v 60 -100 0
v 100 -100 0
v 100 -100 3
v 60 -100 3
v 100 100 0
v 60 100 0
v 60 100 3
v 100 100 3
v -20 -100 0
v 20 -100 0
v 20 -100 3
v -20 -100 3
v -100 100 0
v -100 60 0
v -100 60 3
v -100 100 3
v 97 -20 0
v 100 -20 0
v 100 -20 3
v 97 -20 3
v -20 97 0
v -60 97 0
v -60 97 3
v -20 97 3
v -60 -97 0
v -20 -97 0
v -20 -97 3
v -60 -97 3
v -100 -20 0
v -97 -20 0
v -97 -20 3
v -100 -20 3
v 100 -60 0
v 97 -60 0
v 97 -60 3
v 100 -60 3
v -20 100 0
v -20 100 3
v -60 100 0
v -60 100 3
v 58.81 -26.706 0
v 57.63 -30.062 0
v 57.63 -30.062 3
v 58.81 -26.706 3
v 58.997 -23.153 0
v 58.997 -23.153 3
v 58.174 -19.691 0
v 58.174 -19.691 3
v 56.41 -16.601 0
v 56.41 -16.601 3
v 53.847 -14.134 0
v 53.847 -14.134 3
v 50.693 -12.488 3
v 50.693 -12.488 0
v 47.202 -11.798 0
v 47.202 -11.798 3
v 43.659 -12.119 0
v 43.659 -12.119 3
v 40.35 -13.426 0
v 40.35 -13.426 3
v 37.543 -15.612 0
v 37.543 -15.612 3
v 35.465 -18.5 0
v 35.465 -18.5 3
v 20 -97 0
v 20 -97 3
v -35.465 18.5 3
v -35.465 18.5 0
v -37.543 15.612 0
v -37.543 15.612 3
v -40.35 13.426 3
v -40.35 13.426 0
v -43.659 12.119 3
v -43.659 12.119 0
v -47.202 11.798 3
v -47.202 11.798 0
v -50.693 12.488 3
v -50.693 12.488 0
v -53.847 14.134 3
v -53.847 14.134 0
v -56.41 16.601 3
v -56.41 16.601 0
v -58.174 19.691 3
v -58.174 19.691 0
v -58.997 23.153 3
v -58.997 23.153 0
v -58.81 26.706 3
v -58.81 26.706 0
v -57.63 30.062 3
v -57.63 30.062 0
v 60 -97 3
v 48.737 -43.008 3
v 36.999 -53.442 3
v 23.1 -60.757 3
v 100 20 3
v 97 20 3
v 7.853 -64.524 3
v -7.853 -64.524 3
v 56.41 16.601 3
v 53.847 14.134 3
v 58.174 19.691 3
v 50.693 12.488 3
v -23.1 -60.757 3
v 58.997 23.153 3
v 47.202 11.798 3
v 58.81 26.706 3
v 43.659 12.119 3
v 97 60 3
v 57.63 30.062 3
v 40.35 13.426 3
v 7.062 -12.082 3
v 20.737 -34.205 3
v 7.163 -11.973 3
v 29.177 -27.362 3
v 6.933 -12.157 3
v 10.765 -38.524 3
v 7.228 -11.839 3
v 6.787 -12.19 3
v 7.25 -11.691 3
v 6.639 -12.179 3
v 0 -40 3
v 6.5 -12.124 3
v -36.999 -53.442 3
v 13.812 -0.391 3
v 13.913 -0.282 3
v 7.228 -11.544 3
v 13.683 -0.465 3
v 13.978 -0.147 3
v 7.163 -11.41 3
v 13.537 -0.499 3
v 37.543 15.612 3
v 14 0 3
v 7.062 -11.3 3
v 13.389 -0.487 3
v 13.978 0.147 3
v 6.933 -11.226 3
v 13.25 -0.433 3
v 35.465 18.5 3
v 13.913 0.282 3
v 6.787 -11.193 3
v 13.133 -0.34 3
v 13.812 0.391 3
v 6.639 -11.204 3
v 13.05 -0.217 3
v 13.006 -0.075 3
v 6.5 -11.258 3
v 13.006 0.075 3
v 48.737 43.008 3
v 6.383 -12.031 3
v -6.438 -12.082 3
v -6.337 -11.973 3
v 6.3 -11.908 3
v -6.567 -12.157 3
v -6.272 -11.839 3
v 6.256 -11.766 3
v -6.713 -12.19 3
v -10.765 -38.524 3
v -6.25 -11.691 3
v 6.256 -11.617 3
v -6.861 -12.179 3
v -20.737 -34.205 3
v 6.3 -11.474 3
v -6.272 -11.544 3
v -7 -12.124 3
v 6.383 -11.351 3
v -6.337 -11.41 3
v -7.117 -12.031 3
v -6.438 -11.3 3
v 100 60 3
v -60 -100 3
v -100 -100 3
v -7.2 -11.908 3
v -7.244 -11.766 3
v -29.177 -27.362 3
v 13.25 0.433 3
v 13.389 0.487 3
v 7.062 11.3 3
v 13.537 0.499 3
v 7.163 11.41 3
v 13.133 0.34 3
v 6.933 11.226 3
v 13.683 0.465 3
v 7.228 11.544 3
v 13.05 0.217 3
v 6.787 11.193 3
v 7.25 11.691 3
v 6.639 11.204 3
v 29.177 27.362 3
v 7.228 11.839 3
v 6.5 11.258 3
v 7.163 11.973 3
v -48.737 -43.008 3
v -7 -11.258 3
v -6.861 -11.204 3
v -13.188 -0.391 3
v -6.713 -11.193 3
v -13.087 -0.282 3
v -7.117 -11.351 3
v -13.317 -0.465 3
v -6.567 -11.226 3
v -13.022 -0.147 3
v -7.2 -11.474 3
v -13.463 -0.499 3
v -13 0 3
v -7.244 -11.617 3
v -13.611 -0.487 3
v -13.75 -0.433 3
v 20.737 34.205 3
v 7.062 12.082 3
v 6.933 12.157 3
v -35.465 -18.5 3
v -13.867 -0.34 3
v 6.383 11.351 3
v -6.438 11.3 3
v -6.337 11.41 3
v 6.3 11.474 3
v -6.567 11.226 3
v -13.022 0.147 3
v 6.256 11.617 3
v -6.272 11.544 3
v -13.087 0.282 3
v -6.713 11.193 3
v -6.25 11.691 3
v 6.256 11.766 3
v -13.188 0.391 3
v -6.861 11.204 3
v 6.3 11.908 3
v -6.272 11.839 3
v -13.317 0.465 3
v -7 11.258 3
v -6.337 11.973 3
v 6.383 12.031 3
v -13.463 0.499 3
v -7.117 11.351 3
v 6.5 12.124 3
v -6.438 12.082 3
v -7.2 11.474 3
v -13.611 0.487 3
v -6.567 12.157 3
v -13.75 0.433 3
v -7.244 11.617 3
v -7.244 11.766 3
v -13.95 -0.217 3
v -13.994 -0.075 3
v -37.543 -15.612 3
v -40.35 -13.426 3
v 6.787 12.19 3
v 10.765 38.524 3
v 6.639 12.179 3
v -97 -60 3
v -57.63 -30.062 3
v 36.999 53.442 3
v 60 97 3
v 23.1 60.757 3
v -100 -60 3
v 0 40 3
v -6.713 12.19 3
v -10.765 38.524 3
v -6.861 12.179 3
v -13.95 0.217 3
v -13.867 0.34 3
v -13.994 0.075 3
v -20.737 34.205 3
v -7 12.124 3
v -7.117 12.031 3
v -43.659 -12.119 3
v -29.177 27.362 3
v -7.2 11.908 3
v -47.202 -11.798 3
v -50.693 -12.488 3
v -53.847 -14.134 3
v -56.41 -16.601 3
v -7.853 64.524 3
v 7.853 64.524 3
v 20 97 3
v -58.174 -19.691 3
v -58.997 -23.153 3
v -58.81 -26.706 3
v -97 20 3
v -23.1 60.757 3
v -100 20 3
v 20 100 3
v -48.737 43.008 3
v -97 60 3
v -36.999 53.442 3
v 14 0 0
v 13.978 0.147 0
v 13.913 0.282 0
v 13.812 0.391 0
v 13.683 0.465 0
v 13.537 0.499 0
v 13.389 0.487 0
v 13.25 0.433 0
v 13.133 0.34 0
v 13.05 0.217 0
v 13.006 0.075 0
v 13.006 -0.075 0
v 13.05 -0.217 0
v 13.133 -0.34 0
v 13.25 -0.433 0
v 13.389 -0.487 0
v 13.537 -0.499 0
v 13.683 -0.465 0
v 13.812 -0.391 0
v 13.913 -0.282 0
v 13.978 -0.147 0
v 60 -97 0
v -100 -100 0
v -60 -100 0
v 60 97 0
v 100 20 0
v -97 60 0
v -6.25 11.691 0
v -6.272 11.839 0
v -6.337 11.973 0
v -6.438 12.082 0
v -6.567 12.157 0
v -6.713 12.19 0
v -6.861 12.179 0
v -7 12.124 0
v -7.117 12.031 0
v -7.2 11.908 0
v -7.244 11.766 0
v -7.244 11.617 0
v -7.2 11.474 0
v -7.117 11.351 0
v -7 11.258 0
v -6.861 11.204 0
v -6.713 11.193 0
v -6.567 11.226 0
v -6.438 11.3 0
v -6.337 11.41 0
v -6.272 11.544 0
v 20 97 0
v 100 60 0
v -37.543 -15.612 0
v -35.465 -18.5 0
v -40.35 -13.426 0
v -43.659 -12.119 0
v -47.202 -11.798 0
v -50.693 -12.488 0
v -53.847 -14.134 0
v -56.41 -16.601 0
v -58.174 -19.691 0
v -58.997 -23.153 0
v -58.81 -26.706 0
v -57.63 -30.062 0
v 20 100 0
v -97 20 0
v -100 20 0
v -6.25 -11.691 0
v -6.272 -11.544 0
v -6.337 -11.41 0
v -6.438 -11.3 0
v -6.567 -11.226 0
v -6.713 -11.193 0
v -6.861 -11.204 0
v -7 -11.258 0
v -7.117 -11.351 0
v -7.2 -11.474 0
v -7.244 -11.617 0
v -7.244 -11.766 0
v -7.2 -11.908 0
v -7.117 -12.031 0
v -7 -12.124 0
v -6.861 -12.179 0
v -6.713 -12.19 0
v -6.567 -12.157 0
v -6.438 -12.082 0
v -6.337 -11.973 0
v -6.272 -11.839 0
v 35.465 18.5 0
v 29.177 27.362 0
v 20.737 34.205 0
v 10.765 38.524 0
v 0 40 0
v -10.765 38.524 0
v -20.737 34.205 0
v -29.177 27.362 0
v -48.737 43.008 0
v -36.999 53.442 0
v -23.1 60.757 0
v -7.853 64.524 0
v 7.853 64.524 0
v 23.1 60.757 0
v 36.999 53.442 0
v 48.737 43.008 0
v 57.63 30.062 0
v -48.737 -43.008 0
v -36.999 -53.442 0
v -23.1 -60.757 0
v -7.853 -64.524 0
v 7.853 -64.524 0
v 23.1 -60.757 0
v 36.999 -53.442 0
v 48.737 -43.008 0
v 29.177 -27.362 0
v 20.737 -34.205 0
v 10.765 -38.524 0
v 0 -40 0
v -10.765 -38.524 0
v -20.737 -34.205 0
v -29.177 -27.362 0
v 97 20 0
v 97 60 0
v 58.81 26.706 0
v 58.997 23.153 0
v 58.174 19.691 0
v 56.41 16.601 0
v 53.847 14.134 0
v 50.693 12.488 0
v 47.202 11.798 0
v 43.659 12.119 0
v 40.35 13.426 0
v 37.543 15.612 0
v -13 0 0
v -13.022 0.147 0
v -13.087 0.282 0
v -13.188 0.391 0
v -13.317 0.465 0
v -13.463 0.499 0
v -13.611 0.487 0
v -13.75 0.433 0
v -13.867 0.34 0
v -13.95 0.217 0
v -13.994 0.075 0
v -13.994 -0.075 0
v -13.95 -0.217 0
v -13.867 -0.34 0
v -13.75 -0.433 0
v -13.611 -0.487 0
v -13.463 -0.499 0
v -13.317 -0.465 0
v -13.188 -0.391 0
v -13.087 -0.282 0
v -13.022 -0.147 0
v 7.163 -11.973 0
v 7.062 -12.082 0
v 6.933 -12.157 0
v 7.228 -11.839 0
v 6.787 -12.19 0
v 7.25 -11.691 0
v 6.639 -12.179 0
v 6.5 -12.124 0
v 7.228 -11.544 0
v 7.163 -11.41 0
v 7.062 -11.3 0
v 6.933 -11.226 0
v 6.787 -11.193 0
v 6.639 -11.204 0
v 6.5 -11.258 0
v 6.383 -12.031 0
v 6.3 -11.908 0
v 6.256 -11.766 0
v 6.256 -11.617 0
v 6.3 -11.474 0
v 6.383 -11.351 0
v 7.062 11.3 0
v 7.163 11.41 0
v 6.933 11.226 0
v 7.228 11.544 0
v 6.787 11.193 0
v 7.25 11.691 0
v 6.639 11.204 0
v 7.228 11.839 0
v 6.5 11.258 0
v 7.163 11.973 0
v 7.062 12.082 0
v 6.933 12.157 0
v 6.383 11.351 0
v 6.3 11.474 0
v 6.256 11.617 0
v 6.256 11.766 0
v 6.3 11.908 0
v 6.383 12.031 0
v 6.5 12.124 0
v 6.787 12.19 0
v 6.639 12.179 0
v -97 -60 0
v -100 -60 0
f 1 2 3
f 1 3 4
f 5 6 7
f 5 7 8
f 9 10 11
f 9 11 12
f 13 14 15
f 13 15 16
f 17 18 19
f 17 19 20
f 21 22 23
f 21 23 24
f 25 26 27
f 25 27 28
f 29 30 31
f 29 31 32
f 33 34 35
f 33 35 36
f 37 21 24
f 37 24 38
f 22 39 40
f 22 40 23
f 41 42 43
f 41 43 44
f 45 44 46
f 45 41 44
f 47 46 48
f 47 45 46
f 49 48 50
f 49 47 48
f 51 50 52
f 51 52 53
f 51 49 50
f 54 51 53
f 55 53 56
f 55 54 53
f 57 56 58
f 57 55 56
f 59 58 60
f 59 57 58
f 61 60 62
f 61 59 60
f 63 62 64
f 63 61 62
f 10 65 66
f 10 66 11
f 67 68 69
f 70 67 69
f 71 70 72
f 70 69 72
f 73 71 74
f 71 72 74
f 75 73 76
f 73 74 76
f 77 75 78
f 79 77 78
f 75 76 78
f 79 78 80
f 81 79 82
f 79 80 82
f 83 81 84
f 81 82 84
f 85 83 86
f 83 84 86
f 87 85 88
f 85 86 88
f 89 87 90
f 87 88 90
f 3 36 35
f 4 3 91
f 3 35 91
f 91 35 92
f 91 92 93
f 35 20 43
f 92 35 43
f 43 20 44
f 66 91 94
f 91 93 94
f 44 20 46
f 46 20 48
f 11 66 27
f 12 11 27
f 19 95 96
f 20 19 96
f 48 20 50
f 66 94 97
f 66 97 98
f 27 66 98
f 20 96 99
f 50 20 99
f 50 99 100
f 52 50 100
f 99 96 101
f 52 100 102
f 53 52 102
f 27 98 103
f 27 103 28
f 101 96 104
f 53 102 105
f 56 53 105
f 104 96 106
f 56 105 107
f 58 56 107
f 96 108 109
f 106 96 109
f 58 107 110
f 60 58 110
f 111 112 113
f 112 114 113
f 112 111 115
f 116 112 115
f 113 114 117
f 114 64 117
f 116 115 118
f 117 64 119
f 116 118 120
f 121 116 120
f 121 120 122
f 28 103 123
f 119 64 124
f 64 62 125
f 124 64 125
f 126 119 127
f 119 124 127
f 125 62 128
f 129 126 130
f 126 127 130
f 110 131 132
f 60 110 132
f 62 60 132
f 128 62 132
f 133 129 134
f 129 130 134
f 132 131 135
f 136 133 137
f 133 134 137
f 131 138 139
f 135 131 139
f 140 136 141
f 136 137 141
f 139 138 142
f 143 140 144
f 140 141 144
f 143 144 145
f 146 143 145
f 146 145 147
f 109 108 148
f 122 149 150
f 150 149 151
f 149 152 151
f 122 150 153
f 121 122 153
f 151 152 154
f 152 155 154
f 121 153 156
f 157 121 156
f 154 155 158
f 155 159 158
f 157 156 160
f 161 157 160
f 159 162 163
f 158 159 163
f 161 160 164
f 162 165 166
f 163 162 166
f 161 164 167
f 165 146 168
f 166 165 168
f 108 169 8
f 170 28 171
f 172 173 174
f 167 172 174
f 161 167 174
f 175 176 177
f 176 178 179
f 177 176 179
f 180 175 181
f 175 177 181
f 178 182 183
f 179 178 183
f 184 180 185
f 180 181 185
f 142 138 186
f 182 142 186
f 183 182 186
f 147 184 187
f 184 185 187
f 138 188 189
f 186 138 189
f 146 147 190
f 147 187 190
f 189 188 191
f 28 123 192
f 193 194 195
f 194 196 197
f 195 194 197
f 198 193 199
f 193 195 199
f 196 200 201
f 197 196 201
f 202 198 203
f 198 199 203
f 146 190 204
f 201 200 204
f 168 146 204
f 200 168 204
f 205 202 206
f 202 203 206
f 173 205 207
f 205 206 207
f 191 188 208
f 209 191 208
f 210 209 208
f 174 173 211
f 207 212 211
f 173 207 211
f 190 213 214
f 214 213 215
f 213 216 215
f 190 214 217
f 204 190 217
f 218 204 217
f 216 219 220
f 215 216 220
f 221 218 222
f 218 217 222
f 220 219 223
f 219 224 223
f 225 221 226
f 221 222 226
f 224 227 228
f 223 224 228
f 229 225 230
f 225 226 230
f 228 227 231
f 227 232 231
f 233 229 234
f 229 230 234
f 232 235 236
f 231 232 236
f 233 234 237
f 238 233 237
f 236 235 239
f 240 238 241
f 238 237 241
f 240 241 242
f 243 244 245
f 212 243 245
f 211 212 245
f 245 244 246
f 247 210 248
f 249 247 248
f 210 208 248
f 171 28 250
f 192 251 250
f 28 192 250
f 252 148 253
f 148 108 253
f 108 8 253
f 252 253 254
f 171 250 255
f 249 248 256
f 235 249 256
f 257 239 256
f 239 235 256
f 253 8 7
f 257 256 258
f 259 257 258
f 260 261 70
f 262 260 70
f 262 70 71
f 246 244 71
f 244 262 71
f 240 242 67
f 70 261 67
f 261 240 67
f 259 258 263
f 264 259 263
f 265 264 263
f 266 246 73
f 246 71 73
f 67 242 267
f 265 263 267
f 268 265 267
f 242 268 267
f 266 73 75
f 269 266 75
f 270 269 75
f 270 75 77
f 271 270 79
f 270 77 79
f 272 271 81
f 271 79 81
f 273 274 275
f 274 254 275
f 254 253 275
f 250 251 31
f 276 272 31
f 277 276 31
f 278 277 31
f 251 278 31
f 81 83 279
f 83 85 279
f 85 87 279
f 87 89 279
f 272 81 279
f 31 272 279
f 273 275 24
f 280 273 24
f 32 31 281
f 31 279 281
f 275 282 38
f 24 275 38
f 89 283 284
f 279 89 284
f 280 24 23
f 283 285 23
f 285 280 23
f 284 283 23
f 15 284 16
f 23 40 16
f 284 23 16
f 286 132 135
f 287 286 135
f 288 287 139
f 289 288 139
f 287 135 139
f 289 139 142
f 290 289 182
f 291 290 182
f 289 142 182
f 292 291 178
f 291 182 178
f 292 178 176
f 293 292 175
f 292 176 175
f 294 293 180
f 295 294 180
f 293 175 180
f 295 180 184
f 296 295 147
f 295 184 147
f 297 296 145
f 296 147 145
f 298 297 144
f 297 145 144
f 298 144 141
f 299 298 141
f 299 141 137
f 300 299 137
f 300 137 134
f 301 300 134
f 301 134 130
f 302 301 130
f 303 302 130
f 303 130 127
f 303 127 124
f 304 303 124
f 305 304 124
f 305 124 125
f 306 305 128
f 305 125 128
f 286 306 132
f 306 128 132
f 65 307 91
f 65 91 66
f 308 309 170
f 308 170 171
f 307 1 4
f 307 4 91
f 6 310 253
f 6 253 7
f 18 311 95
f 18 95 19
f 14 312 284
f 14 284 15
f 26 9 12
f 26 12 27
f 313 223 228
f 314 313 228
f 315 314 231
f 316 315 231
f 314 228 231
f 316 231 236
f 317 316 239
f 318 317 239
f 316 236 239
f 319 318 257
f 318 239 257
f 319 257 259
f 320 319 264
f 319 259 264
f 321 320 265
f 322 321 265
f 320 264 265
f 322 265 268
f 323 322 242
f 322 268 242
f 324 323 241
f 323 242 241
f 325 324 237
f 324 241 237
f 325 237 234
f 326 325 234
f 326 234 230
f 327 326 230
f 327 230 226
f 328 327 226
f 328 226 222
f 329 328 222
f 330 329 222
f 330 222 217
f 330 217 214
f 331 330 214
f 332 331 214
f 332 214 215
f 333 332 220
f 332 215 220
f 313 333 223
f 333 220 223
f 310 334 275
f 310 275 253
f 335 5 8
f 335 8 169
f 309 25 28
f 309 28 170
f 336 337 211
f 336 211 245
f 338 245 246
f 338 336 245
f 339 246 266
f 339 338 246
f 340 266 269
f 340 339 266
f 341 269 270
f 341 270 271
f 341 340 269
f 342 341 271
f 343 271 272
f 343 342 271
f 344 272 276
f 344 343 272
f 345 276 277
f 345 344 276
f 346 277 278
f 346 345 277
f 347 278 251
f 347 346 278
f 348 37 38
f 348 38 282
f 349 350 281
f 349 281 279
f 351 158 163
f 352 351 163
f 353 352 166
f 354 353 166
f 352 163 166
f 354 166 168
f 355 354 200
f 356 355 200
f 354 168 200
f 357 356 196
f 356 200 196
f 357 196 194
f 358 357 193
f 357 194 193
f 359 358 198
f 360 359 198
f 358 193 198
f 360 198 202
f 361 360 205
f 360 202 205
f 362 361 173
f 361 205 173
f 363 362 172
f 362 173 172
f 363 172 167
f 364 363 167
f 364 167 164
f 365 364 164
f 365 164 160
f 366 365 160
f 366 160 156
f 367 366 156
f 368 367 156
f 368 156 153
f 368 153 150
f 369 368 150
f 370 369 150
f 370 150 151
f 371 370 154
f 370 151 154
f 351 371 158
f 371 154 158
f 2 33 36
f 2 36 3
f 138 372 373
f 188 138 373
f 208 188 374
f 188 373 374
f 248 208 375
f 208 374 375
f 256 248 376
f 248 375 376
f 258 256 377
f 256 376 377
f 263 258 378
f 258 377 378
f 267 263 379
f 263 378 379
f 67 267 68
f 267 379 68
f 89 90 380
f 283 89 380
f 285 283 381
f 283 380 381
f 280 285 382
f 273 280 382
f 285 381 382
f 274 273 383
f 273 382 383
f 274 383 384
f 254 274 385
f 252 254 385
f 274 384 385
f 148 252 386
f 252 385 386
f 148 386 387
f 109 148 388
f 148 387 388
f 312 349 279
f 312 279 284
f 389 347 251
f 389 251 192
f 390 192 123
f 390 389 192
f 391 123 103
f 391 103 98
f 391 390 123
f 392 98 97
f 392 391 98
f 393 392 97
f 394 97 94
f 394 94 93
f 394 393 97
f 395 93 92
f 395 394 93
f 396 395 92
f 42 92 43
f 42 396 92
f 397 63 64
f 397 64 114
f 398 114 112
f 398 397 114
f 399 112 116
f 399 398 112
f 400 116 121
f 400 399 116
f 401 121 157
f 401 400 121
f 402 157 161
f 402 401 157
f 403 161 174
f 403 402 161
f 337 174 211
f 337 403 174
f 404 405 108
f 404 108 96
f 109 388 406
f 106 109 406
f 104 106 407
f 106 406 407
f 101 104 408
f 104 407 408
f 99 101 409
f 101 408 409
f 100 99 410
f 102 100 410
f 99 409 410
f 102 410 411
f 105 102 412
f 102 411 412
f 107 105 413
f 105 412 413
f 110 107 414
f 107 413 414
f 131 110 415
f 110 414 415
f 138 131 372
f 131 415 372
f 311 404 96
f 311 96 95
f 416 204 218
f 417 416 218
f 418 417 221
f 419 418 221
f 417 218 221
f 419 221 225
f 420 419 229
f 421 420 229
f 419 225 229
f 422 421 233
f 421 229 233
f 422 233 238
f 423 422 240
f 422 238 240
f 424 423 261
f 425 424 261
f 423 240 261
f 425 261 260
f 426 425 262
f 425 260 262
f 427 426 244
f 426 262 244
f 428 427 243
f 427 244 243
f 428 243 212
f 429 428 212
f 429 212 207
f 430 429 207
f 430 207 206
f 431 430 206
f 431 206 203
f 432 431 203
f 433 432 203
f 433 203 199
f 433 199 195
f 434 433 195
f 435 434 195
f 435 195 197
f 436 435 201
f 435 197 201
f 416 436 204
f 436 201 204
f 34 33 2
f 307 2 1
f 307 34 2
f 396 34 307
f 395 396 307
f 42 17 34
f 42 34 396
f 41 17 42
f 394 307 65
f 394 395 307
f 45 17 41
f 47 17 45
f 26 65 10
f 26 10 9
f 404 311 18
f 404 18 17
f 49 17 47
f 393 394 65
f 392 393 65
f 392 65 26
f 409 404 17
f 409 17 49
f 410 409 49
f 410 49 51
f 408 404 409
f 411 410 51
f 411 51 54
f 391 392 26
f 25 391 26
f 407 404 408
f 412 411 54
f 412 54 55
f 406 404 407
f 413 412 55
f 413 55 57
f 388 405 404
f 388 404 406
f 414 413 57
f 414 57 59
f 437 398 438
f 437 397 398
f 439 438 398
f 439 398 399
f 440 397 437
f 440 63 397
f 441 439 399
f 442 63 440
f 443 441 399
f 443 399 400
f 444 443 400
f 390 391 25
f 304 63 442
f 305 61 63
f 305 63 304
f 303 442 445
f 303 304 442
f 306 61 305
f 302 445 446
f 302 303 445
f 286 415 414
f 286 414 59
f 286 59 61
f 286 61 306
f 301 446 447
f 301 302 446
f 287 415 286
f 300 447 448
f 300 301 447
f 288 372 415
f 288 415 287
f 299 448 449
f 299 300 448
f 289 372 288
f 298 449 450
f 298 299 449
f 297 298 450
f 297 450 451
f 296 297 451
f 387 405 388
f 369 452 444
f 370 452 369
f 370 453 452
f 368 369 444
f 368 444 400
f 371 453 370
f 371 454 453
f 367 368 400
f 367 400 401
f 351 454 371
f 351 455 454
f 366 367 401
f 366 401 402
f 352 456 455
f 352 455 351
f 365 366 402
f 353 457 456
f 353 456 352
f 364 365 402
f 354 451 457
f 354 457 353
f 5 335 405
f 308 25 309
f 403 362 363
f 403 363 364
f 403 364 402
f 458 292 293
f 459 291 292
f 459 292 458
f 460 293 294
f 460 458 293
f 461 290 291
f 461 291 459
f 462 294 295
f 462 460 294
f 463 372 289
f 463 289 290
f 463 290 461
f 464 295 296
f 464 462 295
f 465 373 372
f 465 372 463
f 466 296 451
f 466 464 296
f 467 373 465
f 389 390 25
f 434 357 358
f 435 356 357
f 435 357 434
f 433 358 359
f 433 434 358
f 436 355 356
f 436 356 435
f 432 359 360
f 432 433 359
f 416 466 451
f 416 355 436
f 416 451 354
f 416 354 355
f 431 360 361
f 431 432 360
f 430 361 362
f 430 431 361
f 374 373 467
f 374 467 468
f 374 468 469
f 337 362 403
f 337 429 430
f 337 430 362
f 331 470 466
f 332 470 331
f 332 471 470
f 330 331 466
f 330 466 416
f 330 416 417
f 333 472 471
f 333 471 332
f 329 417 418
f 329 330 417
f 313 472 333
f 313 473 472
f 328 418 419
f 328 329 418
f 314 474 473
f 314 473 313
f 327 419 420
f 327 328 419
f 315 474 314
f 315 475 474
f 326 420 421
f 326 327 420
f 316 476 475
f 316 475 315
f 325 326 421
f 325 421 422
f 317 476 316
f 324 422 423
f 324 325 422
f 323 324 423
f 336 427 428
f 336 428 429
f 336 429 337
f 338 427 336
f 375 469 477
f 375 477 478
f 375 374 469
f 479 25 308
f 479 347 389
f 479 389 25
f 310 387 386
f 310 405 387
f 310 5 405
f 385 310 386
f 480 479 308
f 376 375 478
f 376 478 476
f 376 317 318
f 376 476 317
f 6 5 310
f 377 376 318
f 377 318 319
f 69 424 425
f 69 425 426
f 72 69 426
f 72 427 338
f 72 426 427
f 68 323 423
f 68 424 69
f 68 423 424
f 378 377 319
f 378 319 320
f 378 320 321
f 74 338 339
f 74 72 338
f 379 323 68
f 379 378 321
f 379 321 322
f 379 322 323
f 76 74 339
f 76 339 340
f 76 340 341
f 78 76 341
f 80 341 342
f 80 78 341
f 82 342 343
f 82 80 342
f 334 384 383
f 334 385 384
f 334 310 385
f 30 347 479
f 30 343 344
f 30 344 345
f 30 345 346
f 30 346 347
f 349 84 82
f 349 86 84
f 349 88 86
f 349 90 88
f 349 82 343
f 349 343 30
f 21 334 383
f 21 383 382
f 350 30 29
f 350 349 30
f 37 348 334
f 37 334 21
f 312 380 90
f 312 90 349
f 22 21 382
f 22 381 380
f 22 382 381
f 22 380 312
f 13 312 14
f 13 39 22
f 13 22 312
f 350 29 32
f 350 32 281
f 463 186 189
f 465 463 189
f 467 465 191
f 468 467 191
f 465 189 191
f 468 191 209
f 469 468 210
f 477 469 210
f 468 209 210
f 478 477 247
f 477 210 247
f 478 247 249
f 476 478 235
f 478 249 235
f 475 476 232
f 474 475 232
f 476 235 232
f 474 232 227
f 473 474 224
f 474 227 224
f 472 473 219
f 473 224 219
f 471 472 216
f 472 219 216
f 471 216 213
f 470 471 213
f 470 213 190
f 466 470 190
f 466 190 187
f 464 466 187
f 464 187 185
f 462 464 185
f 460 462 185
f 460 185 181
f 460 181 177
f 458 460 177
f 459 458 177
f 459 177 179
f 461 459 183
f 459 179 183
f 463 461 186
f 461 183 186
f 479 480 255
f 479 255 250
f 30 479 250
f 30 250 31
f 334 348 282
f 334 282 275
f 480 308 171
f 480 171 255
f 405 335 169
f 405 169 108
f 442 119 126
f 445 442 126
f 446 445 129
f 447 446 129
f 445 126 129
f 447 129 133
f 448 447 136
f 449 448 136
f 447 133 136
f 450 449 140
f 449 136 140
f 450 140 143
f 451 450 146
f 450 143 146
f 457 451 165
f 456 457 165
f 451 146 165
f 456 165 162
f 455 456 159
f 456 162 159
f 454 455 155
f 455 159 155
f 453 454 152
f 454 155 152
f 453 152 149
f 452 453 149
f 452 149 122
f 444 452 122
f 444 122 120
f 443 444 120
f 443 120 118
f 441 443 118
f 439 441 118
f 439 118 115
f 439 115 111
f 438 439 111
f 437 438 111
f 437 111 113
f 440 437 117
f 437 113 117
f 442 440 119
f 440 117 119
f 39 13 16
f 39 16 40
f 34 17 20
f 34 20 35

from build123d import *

# Parameters (mm, degrees)
BOSS_EXTRUDE1_DEPTH = 3
SKETCH2_R           = 0.5
CUT_EXTRUDE1_DEPTH  = 3


with BuildPart() as part:
    # Sketch1 → Boss-Extrude1 (new body)
    with BuildSketch(Plane.XY):
        Polygon((100, -60), (100, -100), (60, -100), (60, -97), (20, -97), (20, -100), (-20, -100), (-20, -97), (-60, -97), (-60, -100), (-100, -100), (-100, -60), (-97, -60), (-97, -20), (-100, -20), (-100, 20), (-97, 20), (-97, 60), (-100, 60), (-100, 100), (-60, 100), (-60, 97), (-20, 97), (-20, 100), (20, 100), (20, 97), (60, 97), (60, 100), (100, 100), (100, 60), (97, 60), (97, 20), (100, 20), (100, -20), (97, -20), (97, -60), align=None)
        with BuildLine():
            ThreePointArc((-57.630385488, -30.062246565), (0, -65), (57.630385488, -30.062246565))
            ThreePointArc((57.630385488, -30.062246565), (52.32882031, -13.198278863), (35.464852608, -18.49984404))
            ThreePointArc((35.464852608, -18.49984404), (0, -40), (-35.464852608, -18.49984404))
            ThreePointArc((-35.464852608, -18.49984404), (-52.32882031, -13.198278863), (-57.630385488, -30.062246565))
        make_face(mode=Mode.SUBTRACT)
        with BuildLine():
            ThreePointArc((35.464852608, 18.49984404), (0, 40), (-35.464852608, 18.49984404))
            ThreePointArc((-35.464852608, 18.49984404), (-52.32882031, 13.198278863), (-57.630385488, 30.062246565))
            ThreePointArc((-57.630385488, 30.062246565), (0, 65), (57.630385488, 30.062246565))
            ThreePointArc((57.630385488, 30.062246565), (52.32882031, 13.198278863), (35.464852608, 18.49984404))
        make_face(mode=Mode.SUBTRACT)
    extrude(amount=BOSS_EXTRUDE1_DEPTH)

    # Sketch2 → Cut-Extrude1 (cut)
    with BuildSketch(Plane.XY.offset(3)):
        with Locations((-13.5, 0)):
            Circle(SKETCH2_R)
        with Locations((-6.75, 11.691342951)):
            Circle(SKETCH2_R)
        with Locations((6.75, 11.691342951)):
            Circle(SKETCH2_R)
        with Locations((13.5, 0)):
            Circle(SKETCH2_R)
        with Locations((6.75, -11.691342951)):
            Circle(SKETCH2_R)
        with Locations((-6.75, -11.691342951)):
            Circle(SKETCH2_R)
    extrude(amount=-CUT_EXTRUDE1_DEPTH, mode=Mode.SUBTRACT)


solid = part.part
